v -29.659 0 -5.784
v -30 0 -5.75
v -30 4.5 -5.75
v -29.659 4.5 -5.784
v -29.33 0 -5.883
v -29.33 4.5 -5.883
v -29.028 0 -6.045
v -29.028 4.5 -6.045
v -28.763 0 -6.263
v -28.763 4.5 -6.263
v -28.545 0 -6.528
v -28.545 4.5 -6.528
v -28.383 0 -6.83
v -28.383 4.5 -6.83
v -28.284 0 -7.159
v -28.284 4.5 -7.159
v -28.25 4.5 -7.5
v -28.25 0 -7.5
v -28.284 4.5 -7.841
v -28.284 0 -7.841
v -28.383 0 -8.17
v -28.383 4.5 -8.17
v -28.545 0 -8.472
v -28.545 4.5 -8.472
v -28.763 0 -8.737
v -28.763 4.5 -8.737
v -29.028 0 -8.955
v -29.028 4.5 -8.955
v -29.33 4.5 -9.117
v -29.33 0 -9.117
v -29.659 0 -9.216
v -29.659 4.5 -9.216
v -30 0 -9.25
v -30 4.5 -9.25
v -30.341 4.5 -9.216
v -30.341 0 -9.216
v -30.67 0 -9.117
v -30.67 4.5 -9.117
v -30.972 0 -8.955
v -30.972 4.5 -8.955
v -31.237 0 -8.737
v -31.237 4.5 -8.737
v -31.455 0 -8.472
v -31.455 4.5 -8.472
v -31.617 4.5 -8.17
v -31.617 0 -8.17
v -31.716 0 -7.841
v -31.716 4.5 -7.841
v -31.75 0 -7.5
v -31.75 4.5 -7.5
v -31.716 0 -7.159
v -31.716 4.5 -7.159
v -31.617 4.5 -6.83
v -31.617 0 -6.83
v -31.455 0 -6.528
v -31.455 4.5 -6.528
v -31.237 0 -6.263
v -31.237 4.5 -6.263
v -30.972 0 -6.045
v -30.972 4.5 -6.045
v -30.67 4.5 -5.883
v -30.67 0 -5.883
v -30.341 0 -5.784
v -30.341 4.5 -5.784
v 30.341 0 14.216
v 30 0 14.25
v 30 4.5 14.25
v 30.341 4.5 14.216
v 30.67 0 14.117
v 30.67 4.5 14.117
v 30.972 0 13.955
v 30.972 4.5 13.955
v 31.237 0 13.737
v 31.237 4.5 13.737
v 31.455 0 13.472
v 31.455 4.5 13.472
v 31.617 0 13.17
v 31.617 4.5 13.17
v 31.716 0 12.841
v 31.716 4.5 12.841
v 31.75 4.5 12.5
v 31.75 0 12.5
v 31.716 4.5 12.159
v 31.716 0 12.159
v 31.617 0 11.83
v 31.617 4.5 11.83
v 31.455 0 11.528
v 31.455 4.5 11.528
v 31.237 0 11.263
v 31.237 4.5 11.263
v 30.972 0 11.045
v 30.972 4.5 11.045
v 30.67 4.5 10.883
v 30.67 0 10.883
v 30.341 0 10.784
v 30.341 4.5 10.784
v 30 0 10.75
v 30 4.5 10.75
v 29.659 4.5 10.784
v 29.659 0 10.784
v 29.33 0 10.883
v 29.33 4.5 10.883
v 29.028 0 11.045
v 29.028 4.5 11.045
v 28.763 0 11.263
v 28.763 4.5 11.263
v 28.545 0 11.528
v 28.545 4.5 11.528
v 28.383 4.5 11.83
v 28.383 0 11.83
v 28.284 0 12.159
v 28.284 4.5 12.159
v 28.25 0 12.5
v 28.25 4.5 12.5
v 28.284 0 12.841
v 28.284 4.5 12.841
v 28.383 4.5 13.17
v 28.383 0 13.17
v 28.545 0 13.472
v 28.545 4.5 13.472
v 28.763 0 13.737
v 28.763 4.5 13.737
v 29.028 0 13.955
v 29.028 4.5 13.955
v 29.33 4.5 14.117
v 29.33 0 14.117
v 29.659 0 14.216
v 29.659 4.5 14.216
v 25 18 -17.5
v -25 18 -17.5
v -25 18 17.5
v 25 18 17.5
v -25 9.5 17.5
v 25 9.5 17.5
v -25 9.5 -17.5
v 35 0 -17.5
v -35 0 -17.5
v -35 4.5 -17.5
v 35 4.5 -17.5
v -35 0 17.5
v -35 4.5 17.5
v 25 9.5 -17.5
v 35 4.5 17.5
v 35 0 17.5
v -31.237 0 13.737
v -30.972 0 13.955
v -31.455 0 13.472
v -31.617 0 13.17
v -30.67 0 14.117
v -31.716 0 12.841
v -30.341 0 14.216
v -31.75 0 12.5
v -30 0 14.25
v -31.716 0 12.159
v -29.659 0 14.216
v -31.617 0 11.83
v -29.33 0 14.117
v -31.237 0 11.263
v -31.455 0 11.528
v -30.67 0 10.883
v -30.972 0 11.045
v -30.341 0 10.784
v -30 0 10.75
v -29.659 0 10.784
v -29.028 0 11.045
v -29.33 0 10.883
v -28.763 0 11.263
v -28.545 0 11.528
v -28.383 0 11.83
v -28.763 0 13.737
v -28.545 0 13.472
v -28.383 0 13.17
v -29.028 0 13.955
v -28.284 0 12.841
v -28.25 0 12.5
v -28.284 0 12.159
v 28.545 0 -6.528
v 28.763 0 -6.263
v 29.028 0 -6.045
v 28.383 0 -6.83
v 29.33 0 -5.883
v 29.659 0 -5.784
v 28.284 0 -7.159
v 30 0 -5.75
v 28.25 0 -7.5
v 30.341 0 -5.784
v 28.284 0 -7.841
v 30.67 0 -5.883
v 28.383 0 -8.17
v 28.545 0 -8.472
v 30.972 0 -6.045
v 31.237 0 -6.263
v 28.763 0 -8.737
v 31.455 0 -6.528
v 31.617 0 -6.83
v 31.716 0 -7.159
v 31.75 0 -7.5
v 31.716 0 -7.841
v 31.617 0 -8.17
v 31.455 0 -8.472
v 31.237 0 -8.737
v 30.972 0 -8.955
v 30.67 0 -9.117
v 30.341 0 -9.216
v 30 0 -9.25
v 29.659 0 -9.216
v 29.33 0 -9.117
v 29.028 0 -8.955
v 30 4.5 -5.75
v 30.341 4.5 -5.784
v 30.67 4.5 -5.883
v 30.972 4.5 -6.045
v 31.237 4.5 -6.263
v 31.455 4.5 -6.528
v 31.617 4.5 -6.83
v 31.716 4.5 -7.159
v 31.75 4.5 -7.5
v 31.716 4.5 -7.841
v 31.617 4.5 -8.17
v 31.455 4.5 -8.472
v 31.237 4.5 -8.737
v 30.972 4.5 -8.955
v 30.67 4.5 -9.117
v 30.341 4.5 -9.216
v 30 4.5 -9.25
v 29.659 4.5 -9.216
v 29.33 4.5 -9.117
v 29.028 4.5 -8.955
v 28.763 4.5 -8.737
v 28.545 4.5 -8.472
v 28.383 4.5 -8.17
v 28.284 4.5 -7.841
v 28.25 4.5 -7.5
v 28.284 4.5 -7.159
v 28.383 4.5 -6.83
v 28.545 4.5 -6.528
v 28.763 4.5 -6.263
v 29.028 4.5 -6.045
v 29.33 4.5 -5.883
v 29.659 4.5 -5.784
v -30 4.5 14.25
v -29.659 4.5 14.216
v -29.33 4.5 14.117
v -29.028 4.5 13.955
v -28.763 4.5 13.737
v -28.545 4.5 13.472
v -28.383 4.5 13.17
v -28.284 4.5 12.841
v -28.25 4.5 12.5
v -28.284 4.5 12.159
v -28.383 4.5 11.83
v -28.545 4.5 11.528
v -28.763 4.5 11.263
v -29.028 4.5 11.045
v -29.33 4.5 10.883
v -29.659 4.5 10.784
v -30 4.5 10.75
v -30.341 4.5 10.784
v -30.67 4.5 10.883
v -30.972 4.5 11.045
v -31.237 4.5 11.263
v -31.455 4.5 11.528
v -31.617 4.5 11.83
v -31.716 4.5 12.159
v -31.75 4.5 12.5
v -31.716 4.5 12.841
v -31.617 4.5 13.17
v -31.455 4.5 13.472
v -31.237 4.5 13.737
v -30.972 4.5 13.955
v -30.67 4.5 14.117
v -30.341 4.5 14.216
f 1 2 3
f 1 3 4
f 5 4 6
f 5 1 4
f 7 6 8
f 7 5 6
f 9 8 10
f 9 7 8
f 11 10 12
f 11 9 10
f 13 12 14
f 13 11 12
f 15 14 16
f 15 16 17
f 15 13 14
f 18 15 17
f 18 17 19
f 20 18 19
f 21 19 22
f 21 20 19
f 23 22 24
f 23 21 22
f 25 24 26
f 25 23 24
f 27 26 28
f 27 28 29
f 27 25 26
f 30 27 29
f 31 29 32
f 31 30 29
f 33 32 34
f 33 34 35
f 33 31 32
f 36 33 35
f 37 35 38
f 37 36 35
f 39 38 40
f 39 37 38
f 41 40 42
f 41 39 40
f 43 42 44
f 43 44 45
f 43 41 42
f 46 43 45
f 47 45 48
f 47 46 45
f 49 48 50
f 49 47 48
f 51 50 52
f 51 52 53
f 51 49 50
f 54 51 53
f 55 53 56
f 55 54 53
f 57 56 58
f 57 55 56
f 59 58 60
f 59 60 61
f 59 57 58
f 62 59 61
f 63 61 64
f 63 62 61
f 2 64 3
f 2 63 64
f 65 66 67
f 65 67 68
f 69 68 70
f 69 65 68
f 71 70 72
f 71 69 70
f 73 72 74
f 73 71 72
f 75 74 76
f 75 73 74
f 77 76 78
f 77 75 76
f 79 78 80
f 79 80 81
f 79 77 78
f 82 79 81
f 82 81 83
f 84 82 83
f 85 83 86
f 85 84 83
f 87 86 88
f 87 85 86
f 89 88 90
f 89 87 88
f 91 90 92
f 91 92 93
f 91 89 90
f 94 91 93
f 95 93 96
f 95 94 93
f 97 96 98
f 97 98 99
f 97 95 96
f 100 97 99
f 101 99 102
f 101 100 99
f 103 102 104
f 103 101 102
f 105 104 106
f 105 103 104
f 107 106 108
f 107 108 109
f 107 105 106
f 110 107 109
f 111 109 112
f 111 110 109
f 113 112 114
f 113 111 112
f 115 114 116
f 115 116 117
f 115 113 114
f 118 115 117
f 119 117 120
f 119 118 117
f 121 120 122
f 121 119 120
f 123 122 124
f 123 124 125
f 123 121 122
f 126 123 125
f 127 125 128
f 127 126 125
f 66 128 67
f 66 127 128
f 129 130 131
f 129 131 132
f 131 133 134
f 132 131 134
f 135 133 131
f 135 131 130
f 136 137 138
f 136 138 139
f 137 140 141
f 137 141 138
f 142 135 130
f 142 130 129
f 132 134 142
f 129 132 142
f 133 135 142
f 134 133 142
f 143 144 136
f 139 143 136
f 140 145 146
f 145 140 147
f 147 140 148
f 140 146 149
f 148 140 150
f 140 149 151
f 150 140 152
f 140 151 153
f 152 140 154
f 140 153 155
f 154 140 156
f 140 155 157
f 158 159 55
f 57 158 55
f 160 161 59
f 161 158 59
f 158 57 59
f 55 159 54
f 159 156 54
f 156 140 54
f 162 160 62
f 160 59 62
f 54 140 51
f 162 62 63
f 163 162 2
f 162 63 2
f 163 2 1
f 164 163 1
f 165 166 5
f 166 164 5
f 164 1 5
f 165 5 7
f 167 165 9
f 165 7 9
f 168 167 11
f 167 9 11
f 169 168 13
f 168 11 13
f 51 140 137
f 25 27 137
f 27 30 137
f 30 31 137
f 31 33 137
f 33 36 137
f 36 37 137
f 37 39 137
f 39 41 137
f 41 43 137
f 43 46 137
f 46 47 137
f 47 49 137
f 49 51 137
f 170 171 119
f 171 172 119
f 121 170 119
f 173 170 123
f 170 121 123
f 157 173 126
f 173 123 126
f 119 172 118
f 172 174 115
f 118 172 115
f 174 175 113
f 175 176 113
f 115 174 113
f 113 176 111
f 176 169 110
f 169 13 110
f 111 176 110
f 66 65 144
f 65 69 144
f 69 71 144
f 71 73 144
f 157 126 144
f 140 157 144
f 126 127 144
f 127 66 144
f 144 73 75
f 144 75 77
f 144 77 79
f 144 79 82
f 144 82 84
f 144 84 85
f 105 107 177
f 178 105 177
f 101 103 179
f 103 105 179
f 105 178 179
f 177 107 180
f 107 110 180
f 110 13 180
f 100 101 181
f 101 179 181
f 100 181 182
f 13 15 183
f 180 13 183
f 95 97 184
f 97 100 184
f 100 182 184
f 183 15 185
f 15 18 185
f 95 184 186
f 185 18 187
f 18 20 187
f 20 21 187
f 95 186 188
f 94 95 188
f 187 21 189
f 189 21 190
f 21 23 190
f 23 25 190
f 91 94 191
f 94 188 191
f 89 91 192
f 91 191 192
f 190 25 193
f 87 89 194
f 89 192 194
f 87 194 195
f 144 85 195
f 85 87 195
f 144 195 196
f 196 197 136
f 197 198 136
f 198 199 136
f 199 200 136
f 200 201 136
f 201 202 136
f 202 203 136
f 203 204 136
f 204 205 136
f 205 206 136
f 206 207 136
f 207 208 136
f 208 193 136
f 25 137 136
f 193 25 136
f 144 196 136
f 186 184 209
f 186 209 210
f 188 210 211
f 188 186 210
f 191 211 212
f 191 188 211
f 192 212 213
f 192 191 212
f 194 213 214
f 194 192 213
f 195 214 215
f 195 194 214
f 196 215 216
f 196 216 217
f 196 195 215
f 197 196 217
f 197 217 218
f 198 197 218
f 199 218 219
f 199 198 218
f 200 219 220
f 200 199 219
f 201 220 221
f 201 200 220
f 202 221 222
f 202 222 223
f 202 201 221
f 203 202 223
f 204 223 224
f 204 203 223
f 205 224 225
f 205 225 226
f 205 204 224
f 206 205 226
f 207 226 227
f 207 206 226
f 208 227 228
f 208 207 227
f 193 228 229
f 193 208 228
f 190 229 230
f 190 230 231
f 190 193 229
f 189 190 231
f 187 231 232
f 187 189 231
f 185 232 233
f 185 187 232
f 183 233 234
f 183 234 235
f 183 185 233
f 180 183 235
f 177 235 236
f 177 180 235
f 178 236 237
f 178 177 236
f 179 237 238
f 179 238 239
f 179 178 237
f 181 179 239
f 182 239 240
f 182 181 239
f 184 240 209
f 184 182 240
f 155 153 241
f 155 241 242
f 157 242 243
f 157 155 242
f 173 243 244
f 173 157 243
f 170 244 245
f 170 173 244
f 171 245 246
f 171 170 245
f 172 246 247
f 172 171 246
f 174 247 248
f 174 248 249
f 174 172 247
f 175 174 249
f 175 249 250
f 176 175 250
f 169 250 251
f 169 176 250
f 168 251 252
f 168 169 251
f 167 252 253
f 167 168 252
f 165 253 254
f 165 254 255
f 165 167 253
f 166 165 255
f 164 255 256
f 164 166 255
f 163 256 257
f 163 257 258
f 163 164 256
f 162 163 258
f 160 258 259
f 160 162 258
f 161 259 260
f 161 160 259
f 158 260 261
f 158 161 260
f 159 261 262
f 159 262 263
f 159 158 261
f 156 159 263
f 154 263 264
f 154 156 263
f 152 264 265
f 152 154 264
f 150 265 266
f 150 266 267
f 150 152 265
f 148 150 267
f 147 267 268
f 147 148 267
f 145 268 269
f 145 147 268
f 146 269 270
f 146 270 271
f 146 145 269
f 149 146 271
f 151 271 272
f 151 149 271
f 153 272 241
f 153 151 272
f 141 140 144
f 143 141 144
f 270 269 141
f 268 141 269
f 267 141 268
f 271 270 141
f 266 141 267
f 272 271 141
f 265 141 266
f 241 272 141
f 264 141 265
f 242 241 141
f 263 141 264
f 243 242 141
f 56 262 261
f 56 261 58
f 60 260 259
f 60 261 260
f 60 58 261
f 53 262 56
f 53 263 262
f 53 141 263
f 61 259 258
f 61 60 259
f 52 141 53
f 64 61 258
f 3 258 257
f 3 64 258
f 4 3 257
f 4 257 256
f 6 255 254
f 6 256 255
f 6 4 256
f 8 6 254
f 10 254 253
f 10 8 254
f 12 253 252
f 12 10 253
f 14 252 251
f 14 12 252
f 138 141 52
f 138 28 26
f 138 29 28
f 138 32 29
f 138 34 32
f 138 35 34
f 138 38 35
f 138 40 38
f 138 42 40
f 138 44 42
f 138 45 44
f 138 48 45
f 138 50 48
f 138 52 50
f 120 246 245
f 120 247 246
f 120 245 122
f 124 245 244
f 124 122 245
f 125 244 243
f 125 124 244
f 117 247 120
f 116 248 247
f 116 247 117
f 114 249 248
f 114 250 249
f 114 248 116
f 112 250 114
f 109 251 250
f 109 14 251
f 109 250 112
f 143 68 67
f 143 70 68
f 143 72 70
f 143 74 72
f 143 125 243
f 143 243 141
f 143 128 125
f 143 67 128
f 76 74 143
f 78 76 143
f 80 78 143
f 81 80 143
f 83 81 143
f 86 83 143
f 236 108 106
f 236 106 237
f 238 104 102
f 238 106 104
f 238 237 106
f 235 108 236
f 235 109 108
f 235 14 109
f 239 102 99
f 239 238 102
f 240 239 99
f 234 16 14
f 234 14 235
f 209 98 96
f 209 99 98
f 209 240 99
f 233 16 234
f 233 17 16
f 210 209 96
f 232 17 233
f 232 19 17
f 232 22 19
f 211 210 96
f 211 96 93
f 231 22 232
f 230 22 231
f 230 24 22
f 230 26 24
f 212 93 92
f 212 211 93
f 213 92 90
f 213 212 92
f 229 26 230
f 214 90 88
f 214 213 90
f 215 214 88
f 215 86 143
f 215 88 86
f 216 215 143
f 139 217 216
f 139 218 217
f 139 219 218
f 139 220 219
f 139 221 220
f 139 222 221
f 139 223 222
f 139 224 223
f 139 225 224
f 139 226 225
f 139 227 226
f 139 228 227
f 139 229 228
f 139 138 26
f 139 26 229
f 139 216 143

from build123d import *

# Parameters (mm, degrees)
SKETCH1_W           = 70
SKETCH1_H           = 35
SKETCH1_R           = 1.75
BOSS_EXTRUDE1_DEPTH = 4.5
SKETCH2_W           = 50
SKETCH2_H           = 35
BOSS_EXTRUDE2_DEPTH = 8.5


with BuildPart() as part:
    # Sketch1 → Boss-Extrude1 (new body)
    with BuildSketch(Plane(origin=(0, 0, 0), x_dir=(1, 0, 0), z_dir=(0, 1, 0))):
        Rectangle(SKETCH1_W, SKETCH1_H)
        with Locations(Location((-30, 7.5, 0), (0, 0, 270))):
            Circle(SKETCH1_R, mode=Mode.SUBTRACT)
        with Locations(Location((30, 7.5, 0), (0, 0, 270))):
            Circle(SKETCH1_R, mode=Mode.SUBTRACT)
        with Locations(Location((30, -12.5, 0), (0, 0, 270))):
            Circle(SKETCH1_R, mode=Mode.SUBTRACT)
        with Locations(Location((-30, -12.5, 0), (0, 0, 270))):
            Circle(SKETCH1_R, mode=Mode.SUBTRACT)
    extrude(amount=BOSS_EXTRUDE1_DEPTH)


with BuildPart() as body_2:
    # Sketch2 → Boss-Extrude2 (new body)
    with BuildSketch(Plane(origin=(0, 9.5, 0), x_dir=(1, 0, 0), z_dir=(0, 1, 0))):
        Rectangle(SKETCH2_W, SKETCH2_H)
    extrude(amount=BOSS_EXTRUDE2_DEPTH)


solid = Compound([part.part, body_2.part])
